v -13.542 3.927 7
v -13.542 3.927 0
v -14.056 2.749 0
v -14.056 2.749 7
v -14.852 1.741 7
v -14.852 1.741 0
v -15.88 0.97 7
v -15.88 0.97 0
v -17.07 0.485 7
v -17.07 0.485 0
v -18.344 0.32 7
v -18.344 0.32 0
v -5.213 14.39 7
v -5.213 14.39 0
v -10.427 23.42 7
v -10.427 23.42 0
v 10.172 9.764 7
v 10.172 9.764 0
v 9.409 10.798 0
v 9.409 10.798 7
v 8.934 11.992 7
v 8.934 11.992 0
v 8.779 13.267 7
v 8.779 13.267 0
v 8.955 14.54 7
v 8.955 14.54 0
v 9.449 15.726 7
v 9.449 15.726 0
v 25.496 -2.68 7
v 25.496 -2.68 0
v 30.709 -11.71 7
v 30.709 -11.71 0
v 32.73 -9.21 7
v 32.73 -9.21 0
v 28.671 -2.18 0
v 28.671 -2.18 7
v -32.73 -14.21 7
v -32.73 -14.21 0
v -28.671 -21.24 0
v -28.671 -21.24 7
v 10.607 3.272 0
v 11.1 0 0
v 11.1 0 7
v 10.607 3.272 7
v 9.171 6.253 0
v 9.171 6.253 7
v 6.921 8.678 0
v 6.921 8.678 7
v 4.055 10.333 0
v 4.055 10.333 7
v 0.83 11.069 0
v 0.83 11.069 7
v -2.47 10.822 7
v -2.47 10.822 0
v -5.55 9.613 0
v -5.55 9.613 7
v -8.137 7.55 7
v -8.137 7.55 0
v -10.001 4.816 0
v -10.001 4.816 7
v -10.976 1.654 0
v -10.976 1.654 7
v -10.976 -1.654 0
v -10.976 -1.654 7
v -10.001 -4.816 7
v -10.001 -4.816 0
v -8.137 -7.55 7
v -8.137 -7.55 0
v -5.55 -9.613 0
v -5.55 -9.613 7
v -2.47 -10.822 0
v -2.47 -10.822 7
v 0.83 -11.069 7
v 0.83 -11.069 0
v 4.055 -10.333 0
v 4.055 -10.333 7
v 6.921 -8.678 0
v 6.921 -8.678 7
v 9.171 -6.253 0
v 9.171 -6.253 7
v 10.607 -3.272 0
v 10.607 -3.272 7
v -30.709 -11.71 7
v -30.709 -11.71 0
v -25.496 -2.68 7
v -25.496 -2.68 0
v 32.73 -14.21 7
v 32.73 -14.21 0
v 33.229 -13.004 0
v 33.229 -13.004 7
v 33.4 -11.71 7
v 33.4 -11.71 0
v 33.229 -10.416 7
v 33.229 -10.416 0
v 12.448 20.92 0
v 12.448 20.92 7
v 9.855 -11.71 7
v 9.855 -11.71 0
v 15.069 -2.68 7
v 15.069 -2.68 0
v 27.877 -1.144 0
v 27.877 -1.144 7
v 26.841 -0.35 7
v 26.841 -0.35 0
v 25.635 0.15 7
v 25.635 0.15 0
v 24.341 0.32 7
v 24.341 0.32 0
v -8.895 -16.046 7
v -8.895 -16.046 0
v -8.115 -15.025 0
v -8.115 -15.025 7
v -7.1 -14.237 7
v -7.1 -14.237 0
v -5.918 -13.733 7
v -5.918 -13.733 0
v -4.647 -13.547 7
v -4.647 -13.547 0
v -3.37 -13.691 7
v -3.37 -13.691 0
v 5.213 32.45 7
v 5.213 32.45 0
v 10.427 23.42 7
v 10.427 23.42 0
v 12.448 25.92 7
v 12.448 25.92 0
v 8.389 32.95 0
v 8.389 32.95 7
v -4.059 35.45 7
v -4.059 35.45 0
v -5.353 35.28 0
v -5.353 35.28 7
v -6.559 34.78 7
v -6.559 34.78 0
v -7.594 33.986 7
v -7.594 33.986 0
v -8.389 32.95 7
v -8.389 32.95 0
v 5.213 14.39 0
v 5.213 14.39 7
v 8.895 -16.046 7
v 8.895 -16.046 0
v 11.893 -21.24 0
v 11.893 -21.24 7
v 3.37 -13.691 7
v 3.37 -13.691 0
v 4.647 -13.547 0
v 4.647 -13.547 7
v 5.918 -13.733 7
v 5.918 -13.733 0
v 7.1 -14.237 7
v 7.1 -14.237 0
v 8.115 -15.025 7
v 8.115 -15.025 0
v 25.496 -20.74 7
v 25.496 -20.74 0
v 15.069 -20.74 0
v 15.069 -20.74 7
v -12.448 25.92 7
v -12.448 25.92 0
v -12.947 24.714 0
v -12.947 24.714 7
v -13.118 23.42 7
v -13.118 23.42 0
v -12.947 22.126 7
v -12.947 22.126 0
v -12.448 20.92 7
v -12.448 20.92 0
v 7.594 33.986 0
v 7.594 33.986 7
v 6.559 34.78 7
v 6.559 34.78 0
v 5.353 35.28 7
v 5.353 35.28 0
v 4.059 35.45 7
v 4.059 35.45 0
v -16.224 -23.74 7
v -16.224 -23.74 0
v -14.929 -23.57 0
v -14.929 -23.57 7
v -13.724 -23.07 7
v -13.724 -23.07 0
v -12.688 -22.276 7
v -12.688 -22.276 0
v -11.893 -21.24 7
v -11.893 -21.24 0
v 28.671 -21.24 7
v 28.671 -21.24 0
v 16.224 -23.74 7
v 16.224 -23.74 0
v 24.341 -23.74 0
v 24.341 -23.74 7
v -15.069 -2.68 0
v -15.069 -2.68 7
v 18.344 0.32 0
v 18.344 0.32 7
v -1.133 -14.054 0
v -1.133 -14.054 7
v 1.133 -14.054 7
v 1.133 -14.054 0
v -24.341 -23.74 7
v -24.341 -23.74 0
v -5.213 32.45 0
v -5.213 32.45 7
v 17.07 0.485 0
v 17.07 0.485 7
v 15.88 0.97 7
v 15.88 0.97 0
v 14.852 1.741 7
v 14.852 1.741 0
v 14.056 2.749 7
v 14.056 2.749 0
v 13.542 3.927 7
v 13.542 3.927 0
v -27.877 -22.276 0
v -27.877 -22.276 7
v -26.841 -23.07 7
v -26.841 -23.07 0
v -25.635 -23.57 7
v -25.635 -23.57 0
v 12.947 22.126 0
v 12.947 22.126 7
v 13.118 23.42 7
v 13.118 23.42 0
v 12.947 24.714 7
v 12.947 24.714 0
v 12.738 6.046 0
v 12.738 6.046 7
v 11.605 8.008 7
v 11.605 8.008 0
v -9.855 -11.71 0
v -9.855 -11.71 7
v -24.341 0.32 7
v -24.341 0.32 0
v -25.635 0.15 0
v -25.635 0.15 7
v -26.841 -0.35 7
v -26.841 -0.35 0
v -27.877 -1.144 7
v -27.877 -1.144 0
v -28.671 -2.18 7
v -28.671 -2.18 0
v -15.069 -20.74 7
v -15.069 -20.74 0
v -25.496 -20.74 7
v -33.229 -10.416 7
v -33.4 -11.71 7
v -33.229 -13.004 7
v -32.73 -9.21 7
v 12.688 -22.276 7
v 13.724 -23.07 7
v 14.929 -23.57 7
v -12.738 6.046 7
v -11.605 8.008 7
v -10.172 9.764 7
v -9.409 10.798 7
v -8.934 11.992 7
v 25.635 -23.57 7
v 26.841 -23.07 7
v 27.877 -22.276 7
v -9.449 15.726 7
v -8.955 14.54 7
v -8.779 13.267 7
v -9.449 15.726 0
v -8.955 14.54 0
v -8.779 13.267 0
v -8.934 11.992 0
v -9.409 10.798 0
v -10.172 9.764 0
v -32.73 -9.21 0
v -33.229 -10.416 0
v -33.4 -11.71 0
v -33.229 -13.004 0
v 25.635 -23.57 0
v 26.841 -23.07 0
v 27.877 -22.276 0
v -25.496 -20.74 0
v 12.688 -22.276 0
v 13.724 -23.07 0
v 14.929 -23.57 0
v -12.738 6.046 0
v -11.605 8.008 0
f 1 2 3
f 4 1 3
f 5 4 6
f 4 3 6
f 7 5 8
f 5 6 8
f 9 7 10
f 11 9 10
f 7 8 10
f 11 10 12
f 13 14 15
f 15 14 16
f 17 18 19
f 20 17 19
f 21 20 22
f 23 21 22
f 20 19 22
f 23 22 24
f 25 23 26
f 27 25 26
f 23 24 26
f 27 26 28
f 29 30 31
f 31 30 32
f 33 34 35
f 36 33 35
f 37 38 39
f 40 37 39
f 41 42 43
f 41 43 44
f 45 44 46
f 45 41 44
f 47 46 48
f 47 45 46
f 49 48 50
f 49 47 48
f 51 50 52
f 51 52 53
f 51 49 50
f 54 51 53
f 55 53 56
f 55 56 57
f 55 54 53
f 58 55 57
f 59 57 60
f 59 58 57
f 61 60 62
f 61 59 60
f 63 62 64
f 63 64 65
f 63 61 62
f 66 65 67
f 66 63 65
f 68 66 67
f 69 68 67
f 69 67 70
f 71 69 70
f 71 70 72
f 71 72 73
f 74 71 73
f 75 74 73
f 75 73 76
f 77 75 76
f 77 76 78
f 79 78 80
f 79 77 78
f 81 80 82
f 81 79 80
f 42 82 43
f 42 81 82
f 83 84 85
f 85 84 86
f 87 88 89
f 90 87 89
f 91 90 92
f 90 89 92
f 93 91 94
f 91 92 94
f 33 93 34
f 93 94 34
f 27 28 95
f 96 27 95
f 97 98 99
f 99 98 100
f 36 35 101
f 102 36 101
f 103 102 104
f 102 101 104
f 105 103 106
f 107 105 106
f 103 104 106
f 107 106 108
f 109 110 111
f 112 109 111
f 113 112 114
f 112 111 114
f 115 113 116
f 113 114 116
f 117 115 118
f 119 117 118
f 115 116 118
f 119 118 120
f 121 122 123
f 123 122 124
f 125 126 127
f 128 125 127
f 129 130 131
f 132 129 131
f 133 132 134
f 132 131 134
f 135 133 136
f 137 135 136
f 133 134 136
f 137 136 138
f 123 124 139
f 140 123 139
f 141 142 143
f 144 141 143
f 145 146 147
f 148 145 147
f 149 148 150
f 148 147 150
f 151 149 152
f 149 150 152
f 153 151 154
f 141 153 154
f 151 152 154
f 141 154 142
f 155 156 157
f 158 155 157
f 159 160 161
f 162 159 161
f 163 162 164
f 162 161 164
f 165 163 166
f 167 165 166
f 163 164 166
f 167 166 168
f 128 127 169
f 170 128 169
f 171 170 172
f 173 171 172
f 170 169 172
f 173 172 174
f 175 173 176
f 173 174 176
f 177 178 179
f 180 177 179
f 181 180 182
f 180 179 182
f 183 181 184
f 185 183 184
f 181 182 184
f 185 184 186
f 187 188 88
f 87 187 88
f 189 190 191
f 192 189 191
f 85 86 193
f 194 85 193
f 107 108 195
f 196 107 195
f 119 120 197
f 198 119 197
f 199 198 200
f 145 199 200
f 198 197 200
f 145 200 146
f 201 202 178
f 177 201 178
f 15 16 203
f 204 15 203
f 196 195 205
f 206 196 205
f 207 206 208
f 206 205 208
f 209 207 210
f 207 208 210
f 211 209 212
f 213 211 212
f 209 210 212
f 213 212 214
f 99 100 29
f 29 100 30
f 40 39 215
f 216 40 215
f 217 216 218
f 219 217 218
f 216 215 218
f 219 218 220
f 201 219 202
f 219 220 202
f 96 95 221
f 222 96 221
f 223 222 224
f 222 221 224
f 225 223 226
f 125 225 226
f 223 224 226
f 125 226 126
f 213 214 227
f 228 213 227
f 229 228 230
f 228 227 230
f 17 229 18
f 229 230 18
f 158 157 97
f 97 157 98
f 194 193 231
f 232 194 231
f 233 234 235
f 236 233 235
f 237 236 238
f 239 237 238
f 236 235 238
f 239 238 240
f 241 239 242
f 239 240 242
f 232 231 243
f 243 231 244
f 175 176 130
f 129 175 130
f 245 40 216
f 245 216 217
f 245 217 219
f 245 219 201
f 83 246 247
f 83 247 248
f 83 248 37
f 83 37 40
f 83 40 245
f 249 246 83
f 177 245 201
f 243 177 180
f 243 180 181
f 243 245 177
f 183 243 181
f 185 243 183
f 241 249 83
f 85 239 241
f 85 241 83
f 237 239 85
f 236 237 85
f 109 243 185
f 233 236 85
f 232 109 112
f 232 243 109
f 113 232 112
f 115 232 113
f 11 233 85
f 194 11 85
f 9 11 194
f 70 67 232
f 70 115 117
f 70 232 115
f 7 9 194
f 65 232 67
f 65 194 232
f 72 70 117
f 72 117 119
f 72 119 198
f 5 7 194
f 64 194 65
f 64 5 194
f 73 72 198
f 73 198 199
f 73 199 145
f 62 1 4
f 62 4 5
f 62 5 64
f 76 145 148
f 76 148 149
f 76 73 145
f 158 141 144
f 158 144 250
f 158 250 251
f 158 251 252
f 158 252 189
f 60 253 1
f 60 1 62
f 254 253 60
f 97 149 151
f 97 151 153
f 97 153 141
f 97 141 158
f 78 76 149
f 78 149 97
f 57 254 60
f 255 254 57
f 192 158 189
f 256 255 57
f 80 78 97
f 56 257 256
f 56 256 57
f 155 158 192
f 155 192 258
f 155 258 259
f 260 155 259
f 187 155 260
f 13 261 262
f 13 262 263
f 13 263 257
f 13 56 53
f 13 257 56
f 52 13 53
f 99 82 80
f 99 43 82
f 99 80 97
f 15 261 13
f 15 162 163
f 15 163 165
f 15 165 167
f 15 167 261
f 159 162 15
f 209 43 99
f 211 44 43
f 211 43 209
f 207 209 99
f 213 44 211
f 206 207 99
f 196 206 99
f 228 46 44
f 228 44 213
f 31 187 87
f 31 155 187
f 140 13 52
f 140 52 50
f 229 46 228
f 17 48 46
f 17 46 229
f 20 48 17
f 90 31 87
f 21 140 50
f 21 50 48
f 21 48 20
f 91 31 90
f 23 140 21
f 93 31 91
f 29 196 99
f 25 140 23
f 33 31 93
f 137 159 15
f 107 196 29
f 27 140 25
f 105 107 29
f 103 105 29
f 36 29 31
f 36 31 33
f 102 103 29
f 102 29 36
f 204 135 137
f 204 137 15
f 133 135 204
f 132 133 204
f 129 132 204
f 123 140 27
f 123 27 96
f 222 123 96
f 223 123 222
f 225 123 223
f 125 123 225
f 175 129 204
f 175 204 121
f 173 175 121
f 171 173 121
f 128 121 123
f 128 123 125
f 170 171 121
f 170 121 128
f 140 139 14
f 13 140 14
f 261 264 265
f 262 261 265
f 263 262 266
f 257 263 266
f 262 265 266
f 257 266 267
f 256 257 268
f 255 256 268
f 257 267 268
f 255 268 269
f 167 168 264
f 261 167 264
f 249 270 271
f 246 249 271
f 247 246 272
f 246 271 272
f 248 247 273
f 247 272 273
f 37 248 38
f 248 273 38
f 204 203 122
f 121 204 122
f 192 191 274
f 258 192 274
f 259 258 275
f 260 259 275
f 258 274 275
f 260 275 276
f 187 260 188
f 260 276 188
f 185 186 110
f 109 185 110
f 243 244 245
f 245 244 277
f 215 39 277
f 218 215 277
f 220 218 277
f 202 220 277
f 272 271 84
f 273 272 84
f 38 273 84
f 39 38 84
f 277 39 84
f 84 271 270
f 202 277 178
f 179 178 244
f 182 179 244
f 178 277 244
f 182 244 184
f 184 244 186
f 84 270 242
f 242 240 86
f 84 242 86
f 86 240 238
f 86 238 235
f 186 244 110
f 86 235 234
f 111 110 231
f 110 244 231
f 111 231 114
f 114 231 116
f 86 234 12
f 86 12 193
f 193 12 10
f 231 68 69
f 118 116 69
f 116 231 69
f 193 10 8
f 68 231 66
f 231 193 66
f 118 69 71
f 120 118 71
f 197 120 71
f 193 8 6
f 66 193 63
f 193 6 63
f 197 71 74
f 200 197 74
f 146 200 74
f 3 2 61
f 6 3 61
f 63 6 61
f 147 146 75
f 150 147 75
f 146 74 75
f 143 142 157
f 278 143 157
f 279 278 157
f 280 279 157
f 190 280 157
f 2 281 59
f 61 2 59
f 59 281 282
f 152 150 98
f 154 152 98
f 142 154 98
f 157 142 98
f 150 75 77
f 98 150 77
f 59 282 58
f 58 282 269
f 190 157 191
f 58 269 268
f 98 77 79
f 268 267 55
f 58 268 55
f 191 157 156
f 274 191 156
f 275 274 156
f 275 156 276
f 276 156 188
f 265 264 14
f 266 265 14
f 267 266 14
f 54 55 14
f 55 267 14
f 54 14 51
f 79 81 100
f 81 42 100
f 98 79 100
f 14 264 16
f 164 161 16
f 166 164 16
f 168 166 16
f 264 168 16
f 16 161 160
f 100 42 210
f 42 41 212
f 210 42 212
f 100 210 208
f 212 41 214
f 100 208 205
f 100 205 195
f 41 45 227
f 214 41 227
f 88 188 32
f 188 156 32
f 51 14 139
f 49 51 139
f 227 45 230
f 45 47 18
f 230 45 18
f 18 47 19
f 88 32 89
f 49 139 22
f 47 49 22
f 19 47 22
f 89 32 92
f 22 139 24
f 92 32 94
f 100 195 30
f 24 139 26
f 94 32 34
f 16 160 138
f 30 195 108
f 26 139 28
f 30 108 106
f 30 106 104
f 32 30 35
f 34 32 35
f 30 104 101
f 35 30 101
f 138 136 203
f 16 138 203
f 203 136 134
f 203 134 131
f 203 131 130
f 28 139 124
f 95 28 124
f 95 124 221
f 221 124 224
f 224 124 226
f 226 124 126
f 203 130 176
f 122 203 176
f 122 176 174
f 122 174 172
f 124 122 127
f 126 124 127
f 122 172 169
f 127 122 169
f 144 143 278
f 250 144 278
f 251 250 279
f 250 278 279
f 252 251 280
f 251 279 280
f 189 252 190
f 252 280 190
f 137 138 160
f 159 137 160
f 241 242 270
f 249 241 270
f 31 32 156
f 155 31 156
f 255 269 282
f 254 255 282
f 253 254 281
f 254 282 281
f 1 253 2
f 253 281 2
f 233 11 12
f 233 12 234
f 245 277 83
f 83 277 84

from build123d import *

# Parameters (mm, degrees)
F0_R     = 11.1
F1_DEPTH = 7


with BuildPart() as f1:
    # F0 (on Top) → F1 (new body)
    with BuildSketch(Plane.XY):
        with BuildLine():
            Line((4.058772, 35.45), (-4.058772, 35.45))
            ThreePointArc((-4.058772, 35.45), (-6.558772, 34.780127), (-8.388899, 32.95))
            Line((-8.388899, 32.95), (-12.447672, 25.92))
            ThreePointArc((-12.447672, 25.92), (-13.117545, 23.42), (-12.447672, 20.92))
            Line((-12.447672, 20.92), (-9.4492, 15.726494))
            ThreePointArc((-9.4492, 15.726494), (-8.815683, 12.624629), (-10.172173, 9.764061))
            ThreePointArc((-10.172173, 9.764061), (-12.210958, 7.05), (-13.542012, 3.92733))
            ThreePointArc((-13.542012, 3.92733), (-15.341091, 1.322291), (-18.344143, 0.32))
            Line((-18.344143, 0.32), (-24.341087, 0.32))
            ThreePointArc((-24.341087, 0.32), (-26.841087, -0.349873), (-28.671214, -2.18))
            Line((-28.671214, -2.18), (-32.729987, -9.21))
            ThreePointArc((-32.729987, -9.21), (-33.39986, -11.71), (-32.729987, -14.21))
            Line((-32.729987, -14.21), (-28.671214, -21.24))
            ThreePointArc((-28.671214, -21.24), (-26.841087, -23.070127), (-24.341087, -23.74))
            Line((-24.341087, -23.74), (-16.223543, -23.74))
            ThreePointArc((-16.223543, -23.74), (-13.723543, -23.070127), (-11.893416, -21.24))
            Line((-11.893416, -21.24), (-8.894944, -16.046494))
            ThreePointArc((-8.894944, -16.046494), (-6.525408, -13.94692), (-3.369838, -13.691391))
            ThreePointArc((-3.369838, -13.691391), (0, -14.1), (3.369838, -13.691391))
            ThreePointArc((3.369838, -13.691391), (6.525408, -13.94692), (8.894944, -16.046494))
            Line((8.894944, -16.046494), (11.893416, -21.24))
            ThreePointArc((11.893416, -21.24), (13.723543, -23.070127), (16.223543, -23.74))
            Line((16.223543, -23.74), (24.341087, -23.74))
            ThreePointArc((24.341087, -23.74), (26.841087, -23.070127), (28.671214, -21.24))
            Line((28.671214, -21.24), (32.729987, -14.21))
            ThreePointArc((32.729987, -14.21), (33.39986, -11.71), (32.729987, -9.21))
            Line((32.729987, -9.21), (28.671214, -2.18))
            ThreePointArc((28.671214, -2.18), (26.841087, -0.349873), (24.341087, 0.32))
            Line((24.341087, 0.32), (18.344143, 0.32))
            ThreePointArc((18.344143, 0.32), (15.341091, 1.322291), (13.542012, 3.92733))
            ThreePointArc((13.542012, 3.92733), (12.210958, 7.05), (10.172173, 9.764061))
            ThreePointArc((10.172173, 9.764061), (8.815683, 12.624629), (9.4492, 15.726494))
            Line((9.4492, 15.726494), (12.447672, 20.92))
            ThreePointArc((12.447672, 20.92), (13.117545, 23.42), (12.447672, 25.92))
            Line((12.447672, 25.92), (8.388899, 32.95))
            ThreePointArc((8.388899, 32.95), (6.558772, 34.780127), (4.058772, 35.45))
        make_face()
        Polygon((-30.709261, -11.71), (-25.495788, -2.68), (-15.068842, -2.68), (-9.855369, -11.71), (-15.068842, -20.74), (-25.495788, -20.74), align=None, mode=Mode.SUBTRACT)
        Polygon((25.495788, -20.74), (15.068842, -20.74), (9.855369, -11.71), (15.068842, -2.68), (25.495788, -2.68), (30.709261, -11.71), align=None, mode=Mode.SUBTRACT)
        Circle(F0_R, mode=Mode.SUBTRACT)
        Polygon((-10.426946, 23.42), (-5.213473, 32.45), (5.213473, 32.45), (10.426946, 23.42), (5.213473, 14.39), (-5.213473, 14.39), align=None, mode=Mode.SUBTRACT)
    extrude(amount=F1_DEPTH)


solid = f1.part
